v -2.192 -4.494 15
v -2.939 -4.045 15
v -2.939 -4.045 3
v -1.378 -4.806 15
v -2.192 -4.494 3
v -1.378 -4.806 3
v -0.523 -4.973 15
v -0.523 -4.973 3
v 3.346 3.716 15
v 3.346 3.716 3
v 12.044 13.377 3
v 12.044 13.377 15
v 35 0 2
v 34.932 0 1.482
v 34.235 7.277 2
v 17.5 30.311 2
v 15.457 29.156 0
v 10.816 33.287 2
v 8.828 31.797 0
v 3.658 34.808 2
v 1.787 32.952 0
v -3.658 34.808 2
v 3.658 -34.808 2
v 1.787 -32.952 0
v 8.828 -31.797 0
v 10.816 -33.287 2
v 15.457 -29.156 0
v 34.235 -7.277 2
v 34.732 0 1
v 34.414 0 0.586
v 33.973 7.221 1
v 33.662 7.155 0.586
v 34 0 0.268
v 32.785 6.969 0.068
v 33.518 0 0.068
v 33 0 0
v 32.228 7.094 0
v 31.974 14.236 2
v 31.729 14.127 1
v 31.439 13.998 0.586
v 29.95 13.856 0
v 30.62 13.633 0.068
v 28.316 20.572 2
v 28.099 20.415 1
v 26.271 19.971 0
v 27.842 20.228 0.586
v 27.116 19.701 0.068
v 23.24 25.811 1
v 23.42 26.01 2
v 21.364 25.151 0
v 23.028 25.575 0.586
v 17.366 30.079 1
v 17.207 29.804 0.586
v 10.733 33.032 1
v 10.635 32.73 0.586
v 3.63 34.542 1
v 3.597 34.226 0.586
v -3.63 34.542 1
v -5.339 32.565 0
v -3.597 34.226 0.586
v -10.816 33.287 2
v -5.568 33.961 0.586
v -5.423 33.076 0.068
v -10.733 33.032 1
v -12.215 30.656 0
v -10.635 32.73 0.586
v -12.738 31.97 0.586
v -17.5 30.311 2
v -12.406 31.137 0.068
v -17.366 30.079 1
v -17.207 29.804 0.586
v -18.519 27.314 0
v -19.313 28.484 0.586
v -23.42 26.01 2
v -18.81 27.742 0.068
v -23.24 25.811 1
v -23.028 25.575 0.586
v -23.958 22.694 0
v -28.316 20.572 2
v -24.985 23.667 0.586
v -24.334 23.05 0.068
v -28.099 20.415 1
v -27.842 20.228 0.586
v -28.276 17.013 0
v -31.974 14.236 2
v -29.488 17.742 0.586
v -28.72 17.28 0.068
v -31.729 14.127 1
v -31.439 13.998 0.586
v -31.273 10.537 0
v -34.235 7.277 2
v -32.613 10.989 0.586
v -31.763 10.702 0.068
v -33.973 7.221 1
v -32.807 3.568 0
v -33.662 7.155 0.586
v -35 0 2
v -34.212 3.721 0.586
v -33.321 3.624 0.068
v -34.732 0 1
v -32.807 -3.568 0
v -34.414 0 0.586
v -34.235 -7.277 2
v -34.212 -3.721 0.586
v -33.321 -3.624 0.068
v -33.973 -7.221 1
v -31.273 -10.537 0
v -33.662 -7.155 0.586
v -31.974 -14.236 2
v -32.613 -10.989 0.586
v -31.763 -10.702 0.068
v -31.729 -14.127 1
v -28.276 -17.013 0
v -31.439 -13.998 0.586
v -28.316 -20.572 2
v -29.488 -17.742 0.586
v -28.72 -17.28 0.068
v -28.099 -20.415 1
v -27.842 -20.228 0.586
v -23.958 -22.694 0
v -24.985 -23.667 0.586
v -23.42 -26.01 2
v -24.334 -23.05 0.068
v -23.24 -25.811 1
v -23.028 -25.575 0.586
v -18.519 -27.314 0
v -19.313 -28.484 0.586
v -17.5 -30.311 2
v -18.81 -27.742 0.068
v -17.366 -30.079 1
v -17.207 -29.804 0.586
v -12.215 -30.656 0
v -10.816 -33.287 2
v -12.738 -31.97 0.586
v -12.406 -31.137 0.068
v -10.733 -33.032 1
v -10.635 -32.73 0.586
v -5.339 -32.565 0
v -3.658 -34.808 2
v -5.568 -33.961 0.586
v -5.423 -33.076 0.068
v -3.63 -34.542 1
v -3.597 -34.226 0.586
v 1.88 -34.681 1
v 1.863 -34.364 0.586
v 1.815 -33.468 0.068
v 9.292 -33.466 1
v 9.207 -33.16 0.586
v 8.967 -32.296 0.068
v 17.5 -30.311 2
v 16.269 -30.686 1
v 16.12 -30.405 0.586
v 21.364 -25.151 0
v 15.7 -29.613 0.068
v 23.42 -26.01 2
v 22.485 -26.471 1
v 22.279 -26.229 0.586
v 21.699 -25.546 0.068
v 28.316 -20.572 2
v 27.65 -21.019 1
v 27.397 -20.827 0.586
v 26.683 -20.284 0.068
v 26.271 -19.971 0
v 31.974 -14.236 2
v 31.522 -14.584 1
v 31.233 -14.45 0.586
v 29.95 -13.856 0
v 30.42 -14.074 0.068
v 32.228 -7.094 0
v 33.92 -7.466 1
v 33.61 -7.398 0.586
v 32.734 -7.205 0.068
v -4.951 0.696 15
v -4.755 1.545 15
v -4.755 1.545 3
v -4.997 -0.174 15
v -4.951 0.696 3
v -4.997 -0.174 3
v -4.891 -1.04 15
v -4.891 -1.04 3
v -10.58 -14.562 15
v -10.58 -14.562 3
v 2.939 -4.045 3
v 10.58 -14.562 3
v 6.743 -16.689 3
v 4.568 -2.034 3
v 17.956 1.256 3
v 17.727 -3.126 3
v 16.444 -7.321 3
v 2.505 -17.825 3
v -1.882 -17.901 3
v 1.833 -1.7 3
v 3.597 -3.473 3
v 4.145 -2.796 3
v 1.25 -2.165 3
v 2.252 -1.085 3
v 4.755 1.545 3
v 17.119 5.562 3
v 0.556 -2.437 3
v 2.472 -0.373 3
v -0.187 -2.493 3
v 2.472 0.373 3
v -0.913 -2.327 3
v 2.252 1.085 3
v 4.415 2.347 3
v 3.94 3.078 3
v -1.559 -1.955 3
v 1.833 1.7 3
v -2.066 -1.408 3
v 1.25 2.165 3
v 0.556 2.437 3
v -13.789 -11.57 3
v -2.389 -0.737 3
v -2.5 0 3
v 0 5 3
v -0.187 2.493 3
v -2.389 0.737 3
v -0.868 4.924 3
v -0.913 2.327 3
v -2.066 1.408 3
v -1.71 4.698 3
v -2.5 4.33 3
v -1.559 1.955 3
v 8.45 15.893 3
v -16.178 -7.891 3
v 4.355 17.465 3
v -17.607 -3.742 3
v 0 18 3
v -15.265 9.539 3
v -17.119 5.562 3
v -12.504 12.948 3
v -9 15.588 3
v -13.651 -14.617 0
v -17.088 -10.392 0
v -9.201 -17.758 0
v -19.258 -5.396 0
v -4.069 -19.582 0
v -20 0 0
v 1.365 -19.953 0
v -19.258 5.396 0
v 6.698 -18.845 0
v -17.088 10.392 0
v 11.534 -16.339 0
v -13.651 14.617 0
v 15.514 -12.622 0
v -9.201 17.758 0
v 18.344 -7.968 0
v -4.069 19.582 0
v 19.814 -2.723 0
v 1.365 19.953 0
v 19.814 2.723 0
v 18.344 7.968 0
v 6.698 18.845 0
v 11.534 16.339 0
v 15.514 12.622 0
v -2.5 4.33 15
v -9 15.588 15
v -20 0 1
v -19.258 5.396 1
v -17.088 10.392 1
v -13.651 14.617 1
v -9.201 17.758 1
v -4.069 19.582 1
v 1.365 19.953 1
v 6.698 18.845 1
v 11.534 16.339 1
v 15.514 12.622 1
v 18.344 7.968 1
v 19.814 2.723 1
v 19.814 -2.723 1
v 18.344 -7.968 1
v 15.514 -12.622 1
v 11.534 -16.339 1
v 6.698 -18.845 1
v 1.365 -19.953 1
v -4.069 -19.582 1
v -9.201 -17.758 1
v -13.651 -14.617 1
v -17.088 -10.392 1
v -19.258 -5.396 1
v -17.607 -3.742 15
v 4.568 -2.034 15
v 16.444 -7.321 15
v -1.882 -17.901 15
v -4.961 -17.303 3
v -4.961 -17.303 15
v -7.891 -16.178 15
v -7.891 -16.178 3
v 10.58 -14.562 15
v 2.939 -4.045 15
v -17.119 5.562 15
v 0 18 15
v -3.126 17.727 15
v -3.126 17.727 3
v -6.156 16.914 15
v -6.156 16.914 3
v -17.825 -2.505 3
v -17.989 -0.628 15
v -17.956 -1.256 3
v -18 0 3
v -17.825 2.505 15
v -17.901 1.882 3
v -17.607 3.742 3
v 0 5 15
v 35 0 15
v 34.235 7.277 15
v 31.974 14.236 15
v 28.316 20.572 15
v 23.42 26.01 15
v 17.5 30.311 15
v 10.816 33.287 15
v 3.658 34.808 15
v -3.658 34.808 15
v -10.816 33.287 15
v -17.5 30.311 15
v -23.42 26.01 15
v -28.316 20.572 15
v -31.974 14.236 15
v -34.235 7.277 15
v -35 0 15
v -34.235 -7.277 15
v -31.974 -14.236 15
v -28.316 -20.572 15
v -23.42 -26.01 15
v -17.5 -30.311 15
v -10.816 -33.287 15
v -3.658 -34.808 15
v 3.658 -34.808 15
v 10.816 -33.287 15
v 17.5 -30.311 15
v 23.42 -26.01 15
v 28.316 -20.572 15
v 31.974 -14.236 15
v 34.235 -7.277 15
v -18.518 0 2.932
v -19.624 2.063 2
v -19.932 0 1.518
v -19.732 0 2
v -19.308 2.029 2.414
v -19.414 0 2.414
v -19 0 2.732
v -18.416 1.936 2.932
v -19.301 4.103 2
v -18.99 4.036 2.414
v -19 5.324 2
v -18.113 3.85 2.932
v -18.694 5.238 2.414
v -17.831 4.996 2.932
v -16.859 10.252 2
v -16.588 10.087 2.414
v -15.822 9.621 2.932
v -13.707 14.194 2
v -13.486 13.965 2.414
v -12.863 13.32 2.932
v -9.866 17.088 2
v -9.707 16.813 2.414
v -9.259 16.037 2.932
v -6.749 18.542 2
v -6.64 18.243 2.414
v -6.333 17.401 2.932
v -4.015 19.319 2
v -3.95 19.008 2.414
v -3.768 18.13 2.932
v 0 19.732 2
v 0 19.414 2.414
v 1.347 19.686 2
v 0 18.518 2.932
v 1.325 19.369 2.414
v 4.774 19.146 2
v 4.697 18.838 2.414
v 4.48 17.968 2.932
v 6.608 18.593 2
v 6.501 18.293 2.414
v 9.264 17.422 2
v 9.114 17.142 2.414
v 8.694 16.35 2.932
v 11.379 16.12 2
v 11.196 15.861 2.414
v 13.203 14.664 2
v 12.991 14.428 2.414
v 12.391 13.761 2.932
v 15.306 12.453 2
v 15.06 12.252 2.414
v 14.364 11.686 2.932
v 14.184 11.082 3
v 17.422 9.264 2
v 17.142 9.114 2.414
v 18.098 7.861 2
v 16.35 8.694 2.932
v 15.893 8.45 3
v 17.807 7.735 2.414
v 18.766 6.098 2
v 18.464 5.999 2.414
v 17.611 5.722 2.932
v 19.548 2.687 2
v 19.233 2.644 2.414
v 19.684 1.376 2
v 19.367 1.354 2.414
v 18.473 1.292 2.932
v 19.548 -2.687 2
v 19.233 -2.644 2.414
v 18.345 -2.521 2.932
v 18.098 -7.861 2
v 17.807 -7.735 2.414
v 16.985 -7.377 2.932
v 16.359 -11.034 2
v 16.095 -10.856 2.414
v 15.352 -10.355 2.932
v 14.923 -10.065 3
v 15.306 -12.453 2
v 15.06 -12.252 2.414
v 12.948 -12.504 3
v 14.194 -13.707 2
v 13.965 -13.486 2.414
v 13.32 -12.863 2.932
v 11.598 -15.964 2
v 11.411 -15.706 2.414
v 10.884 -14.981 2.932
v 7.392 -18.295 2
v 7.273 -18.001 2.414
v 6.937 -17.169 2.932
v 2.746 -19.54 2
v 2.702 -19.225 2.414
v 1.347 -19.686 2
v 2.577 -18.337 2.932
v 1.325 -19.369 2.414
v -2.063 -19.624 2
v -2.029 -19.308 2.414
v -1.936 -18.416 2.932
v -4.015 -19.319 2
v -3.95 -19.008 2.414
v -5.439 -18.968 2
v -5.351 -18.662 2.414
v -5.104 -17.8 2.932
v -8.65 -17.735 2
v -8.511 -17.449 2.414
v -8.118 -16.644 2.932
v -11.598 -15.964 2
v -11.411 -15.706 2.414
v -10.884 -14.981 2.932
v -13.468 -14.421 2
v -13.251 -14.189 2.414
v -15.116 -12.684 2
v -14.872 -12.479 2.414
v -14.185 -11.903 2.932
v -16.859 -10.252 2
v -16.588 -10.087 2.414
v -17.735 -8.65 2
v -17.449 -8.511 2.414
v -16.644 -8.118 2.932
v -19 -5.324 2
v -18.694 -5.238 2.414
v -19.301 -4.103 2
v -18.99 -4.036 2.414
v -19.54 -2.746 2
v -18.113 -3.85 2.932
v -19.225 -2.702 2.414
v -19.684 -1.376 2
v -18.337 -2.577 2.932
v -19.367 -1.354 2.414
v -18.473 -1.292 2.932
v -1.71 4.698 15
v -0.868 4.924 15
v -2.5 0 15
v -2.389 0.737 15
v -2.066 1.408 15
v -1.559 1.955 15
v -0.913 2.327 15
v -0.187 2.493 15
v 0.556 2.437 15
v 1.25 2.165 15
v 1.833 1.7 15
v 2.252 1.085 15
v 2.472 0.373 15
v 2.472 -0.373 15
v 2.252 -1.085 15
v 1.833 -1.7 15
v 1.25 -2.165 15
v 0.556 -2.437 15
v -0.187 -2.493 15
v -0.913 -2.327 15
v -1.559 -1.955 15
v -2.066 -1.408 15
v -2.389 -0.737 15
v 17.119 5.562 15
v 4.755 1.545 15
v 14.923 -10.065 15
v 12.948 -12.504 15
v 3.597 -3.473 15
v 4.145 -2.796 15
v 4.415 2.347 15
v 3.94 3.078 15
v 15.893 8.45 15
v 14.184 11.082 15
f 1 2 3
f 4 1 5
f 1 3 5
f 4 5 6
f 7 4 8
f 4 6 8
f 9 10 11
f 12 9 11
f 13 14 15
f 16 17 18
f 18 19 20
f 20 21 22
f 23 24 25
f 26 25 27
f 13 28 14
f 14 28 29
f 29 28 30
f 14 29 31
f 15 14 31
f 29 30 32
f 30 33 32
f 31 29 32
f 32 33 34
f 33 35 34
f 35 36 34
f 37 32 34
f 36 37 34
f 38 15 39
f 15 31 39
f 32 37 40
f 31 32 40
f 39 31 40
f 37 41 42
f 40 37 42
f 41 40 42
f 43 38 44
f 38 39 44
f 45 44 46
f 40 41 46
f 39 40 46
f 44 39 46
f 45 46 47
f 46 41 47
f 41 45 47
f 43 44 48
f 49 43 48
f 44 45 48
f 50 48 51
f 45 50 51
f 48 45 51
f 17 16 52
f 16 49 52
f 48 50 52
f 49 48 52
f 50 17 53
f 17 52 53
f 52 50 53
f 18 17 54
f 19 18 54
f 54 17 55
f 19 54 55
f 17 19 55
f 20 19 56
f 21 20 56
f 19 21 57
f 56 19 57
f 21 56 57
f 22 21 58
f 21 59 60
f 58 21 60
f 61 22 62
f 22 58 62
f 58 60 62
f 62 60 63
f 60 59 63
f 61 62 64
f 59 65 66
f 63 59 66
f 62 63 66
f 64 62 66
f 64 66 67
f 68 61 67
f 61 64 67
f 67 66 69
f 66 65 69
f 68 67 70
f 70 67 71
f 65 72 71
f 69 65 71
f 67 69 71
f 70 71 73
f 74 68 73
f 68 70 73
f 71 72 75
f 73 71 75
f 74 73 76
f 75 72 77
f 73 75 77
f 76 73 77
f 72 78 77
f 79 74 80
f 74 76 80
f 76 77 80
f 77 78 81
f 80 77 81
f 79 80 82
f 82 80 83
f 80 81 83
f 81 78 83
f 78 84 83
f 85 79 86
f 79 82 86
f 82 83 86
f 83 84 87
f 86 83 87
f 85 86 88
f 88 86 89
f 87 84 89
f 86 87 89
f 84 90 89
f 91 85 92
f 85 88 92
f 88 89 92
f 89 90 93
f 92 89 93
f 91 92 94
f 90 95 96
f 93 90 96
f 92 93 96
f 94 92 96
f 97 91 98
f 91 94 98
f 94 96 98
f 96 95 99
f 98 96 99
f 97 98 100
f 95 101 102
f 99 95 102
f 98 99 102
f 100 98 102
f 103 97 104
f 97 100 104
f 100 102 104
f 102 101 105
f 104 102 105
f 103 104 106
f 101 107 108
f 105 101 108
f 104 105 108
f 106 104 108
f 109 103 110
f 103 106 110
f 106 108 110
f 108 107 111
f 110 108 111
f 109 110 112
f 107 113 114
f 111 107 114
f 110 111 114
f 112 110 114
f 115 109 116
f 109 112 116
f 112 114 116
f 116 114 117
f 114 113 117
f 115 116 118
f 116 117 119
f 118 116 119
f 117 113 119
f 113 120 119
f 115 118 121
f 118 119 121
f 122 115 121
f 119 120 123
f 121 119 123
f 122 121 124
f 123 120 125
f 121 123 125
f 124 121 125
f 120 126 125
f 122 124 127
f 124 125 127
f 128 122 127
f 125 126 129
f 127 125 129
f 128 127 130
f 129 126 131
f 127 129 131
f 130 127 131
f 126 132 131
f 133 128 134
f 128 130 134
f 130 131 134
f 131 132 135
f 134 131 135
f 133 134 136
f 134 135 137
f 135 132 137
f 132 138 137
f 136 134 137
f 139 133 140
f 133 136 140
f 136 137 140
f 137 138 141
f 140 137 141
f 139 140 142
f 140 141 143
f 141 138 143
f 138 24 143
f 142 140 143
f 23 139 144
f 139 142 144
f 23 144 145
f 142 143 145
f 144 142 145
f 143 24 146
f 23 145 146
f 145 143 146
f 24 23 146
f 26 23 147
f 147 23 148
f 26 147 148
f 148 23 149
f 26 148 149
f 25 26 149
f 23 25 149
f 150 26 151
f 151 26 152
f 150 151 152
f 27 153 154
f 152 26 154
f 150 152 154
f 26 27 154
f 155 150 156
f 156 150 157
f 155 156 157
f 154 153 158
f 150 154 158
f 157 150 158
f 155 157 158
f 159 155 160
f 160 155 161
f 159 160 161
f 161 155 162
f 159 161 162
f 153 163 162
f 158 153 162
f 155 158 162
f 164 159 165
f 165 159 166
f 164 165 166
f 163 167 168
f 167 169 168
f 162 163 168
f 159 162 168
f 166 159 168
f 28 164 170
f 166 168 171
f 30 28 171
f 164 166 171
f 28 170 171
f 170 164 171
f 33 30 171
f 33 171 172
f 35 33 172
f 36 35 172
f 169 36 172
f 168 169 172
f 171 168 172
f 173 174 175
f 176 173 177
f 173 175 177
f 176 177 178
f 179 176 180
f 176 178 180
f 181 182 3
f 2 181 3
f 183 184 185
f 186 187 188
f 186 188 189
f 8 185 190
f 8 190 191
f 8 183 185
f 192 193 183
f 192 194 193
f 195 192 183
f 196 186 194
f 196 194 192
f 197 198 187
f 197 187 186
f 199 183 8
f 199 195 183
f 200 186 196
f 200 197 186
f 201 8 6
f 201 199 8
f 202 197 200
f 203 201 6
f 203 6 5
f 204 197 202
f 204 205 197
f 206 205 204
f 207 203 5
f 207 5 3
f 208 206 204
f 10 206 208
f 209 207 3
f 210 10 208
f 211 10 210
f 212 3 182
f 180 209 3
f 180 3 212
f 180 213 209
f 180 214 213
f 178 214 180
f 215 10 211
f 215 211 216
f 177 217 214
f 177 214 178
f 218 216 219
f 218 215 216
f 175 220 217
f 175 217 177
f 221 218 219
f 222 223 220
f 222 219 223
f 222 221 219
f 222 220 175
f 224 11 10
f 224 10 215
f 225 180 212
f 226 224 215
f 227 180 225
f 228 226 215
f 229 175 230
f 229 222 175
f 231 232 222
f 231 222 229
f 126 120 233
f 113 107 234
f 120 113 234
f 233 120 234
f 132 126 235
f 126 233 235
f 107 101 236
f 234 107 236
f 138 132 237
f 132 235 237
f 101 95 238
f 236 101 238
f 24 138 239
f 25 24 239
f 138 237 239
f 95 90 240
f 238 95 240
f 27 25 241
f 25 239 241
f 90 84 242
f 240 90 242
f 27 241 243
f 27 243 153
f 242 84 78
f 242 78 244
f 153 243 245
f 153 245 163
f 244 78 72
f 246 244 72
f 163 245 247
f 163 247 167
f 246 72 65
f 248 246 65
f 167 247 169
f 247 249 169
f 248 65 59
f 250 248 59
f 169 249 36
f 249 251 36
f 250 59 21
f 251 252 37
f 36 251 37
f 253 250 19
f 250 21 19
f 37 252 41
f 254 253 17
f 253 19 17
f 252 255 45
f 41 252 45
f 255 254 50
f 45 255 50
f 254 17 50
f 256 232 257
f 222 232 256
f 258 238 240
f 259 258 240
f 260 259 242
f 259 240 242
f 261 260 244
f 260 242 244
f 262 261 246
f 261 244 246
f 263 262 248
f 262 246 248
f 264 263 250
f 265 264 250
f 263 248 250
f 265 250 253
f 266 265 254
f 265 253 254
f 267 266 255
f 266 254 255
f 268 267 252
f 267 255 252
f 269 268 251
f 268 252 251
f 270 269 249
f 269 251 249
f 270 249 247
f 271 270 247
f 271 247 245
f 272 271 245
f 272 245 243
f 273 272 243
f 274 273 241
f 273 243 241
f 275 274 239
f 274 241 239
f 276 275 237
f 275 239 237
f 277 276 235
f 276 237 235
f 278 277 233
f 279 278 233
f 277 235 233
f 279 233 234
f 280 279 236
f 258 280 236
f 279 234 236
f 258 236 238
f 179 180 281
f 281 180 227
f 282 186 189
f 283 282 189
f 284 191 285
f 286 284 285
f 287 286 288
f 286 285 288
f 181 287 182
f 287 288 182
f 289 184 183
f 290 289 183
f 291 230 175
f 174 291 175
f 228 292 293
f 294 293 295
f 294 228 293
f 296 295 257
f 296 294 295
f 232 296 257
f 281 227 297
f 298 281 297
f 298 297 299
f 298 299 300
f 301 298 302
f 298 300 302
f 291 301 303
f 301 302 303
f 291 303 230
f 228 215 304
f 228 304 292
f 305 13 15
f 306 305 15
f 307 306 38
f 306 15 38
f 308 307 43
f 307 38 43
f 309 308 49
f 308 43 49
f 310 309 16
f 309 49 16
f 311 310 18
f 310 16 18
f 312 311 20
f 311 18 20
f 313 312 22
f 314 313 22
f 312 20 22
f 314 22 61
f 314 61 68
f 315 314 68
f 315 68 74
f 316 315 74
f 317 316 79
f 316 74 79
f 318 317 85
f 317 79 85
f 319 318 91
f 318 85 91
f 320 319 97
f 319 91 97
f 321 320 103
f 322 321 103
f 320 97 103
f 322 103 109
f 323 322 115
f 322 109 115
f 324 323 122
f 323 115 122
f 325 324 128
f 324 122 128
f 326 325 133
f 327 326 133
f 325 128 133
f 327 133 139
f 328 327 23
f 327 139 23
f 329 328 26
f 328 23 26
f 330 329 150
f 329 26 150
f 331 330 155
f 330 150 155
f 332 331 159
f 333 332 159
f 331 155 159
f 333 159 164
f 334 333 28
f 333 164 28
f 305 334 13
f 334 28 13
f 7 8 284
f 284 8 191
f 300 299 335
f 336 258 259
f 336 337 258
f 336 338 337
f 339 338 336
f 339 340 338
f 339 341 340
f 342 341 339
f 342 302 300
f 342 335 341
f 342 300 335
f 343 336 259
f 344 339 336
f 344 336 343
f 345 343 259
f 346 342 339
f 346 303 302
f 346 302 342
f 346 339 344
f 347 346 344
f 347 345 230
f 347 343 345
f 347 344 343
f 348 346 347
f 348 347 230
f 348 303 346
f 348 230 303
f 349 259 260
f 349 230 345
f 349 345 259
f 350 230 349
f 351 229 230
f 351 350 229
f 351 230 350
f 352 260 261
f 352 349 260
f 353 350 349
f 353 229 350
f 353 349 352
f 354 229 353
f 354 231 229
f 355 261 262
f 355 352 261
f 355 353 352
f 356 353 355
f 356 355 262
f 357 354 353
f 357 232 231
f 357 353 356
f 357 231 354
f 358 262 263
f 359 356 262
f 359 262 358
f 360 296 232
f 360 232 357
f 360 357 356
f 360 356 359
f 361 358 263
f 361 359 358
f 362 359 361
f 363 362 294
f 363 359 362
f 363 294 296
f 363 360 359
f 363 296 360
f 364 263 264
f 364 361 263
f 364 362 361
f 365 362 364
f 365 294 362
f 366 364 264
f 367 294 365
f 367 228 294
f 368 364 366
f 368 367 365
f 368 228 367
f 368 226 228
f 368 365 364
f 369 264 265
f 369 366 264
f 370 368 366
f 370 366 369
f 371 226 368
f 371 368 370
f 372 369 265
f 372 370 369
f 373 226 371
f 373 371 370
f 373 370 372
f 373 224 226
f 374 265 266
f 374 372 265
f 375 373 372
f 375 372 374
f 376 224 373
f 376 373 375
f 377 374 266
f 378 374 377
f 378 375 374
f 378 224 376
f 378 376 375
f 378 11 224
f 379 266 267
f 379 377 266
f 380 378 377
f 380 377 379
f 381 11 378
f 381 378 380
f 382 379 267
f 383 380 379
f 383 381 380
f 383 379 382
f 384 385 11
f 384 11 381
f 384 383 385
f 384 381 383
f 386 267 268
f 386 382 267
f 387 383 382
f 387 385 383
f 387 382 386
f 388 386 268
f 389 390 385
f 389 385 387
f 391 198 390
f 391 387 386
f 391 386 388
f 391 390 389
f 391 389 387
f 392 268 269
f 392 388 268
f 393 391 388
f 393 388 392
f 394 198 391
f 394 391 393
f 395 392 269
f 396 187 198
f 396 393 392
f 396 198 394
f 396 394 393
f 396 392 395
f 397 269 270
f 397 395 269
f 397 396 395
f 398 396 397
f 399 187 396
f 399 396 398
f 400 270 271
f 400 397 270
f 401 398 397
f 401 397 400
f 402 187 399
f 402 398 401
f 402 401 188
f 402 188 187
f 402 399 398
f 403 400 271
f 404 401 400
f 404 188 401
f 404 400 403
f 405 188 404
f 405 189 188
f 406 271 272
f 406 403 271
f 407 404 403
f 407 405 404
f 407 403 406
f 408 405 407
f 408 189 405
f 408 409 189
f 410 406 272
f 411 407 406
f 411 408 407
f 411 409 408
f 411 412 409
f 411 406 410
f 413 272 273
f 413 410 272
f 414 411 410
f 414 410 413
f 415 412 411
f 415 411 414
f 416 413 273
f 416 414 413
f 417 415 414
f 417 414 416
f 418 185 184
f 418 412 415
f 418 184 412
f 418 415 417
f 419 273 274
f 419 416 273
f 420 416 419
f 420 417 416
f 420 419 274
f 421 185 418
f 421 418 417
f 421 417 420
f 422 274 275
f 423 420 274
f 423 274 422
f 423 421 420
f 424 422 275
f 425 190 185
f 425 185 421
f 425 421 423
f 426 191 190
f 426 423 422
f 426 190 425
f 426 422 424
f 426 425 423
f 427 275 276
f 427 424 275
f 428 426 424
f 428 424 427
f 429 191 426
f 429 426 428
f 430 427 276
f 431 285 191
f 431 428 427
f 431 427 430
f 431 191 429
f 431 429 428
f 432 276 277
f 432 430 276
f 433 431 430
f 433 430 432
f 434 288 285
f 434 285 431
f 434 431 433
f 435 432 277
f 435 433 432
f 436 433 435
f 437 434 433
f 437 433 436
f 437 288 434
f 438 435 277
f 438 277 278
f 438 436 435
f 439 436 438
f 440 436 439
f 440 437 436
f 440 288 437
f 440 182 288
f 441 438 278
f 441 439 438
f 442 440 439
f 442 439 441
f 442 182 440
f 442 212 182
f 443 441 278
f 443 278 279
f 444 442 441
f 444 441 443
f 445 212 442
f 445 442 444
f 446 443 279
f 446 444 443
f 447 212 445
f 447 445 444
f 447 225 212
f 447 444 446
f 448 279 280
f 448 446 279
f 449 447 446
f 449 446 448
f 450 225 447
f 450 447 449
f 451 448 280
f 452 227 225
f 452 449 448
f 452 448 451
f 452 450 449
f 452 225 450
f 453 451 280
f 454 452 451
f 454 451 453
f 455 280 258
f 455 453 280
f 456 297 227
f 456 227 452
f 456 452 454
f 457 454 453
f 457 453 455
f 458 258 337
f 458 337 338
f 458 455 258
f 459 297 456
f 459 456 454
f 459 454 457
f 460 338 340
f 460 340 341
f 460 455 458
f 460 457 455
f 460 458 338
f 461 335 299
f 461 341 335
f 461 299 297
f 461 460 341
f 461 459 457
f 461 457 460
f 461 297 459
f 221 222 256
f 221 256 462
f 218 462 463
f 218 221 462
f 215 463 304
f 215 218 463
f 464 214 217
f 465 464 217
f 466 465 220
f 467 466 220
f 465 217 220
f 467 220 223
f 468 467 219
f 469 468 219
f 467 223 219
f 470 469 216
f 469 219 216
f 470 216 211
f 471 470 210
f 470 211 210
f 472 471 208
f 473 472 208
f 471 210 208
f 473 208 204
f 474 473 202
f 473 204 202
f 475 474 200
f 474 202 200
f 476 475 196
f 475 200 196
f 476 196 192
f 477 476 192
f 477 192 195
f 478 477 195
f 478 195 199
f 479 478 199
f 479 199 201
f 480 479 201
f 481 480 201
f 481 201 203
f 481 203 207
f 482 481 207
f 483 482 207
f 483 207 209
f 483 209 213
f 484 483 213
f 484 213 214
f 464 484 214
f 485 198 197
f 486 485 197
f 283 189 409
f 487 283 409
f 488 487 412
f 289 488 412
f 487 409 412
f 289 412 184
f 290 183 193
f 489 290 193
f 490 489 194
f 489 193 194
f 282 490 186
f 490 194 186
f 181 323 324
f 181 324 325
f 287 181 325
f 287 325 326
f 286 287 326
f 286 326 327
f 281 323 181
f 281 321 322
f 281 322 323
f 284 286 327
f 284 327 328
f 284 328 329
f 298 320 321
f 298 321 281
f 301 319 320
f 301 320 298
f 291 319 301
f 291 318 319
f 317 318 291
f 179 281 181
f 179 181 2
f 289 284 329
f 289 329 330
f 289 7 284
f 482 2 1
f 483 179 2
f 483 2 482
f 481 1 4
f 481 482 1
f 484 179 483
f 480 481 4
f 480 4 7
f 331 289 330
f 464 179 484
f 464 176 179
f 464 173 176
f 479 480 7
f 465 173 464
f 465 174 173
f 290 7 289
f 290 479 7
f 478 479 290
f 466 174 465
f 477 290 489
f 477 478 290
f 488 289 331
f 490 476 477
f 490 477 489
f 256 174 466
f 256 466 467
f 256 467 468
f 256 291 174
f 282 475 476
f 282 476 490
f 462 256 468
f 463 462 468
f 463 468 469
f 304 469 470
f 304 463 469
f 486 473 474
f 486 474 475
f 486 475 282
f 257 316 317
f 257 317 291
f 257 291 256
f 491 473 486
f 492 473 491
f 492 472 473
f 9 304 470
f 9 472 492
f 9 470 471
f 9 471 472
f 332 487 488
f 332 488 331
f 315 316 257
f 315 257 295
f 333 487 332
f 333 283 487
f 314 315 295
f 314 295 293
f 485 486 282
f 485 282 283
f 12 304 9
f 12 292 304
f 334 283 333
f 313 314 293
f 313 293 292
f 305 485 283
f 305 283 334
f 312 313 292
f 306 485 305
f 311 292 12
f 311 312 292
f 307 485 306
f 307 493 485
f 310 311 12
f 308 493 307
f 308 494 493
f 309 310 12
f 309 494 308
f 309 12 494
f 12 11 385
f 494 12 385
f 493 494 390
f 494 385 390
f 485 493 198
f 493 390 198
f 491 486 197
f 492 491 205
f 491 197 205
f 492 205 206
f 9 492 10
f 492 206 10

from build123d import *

# Parameters (mm, degrees)
SKETCH1_R           = 35
BOSS_EXTRUDE1_DEPTH = 15
SKETCH2_R           = 20
CUT_EXTRUDE1_DEPTH  = 3
FILLET1_R           = 2
FILLET2_R           = 2
SKETCH4_R           = 2.5
CUT_EXTRUDE2_DEPTH  = 51.931326382
CUT_EXTRUDE3_DEPTH  = 51.931326382


with BuildPart() as part:
    # Sketch1 → Boss-Extrude1 (new body)
    with BuildSketch(Plane.XY):
        Circle(SKETCH1_R)
    extrude(amount=BOSS_EXTRUDE1_DEPTH)

    # Sketch2 → Cut-Extrude1 (cut)
    with BuildSketch(Plane(origin=(0, 0, 0), x_dir=(-1, 0, 0), z_dir=(0, 0, -1))):
        Circle(SKETCH2_R)
    extrude(amount=-CUT_EXTRUDE1_DEPTH, mode=Mode.SUBTRACT)

    # Fillet1
    fillet1_edges = [part.edges().sort_by_distance(p)[0] for p in [
        (-35, 0, 0),
    ]]
    fillet(fillet1_edges, radius=FILLET1_R)

    # Fillet2
    fillet2_edges = [part.edges().sort_by_distance(p)[0] for p in [
        (20, 0, 3),
    ]]
    fillet(fillet2_edges, radius=FILLET2_R)

    # Sketch4 → Cut-Extrude2 (cut, through all)
    with BuildSketch(Plane(origin=(0, 0, 3), x_dir=(-1, 0, 0), z_dir=(0, 0, -1))):
        Circle(SKETCH4_R)
    extrude(amount=-CUT_EXTRUDE2_DEPTH, mode=Mode.SUBTRACT)

    # Sketch5 → Cut-Extrude3 (cut, through all)
    with BuildSketch(Plane(origin=(0, 0, 3), x_dir=(-1, 0, 0), z_dir=(0, 0, -1))):
        with BuildLine():
            Line((0, 5), (0, 18))
            ThreePointArc((0, 18), (4.658742812, 17.386664873), (9, 15.588457268))
            Line((9, 15.588457268), (2.5, 4.330127019))
            ThreePointArc((2.5, 4.330127019), (1.294095226, 4.829629131), (0, 5))
        make_face()
        with BuildLine():
            Line((4.890738004, -1.039558454), (17.606656813, -3.742410435))
            ThreePointArc((17.606656813, -3.742410435), (17.975331626, 0.942047212), (17.119017293, 5.562305899))
            Line((17.119017293, 5.562305899), (4.755282581, 1.545084972))
            ThreePointArc((4.755282581, 1.545084972), (4.993147674, 0.261679781), (4.890738004, -1.039558454))
        make_face()
        with BuildLine():
            Line((0.522642316, -4.972609477), (1.881512339, -17.901394117))
            ThreePointArc((1.881512339, -17.901394117), (6.450623092, -16.804447677), (10.580134541, -14.562305899))
            Line((10.580134541, -14.562305899), (2.938926261, -4.045084972))
            ThreePointArc((2.938926261, -4.045084972), (1.791839748, -4.667902132), (0.522642316, -4.972609477))
        make_face()
        with BuildLine():
            Line((-4.567727288, -2.033683215), (-16.443818238, -7.321259575))
            ThreePointArc((-16.443818238, -7.321259575), (-13.988627306, -11.327767039), (-10.580134541, -14.562305899))
            Line((-10.580134541, -14.562305899), (-2.938926261, -4.045084972))
            ThreePointArc((-2.938926261, -4.045084972), (-3.885729807, -3.146601955), (-4.567727288, -2.033683215))
        make_face()
        with BuildLine():
            Line((-3.345653032, 3.715724127), (-12.044350914, 13.376606859))
            ThreePointArc((-12.044350914, 13.376606859), (-15.096070223, 9.80350263), (-17.119017293, 5.562305899))
            Line((-17.119017293, 5.562305899), (-4.755282581, 1.545084972))
            ThreePointArc((-4.755282581, 1.545084972), (-4.19335284, 2.723195175), (-3.345653032, 3.715724127))
        make_face()
    extrude(amount=-CUT_EXTRUDE3_DEPTH, mode=Mode.SUBTRACT)


solid = part.part
